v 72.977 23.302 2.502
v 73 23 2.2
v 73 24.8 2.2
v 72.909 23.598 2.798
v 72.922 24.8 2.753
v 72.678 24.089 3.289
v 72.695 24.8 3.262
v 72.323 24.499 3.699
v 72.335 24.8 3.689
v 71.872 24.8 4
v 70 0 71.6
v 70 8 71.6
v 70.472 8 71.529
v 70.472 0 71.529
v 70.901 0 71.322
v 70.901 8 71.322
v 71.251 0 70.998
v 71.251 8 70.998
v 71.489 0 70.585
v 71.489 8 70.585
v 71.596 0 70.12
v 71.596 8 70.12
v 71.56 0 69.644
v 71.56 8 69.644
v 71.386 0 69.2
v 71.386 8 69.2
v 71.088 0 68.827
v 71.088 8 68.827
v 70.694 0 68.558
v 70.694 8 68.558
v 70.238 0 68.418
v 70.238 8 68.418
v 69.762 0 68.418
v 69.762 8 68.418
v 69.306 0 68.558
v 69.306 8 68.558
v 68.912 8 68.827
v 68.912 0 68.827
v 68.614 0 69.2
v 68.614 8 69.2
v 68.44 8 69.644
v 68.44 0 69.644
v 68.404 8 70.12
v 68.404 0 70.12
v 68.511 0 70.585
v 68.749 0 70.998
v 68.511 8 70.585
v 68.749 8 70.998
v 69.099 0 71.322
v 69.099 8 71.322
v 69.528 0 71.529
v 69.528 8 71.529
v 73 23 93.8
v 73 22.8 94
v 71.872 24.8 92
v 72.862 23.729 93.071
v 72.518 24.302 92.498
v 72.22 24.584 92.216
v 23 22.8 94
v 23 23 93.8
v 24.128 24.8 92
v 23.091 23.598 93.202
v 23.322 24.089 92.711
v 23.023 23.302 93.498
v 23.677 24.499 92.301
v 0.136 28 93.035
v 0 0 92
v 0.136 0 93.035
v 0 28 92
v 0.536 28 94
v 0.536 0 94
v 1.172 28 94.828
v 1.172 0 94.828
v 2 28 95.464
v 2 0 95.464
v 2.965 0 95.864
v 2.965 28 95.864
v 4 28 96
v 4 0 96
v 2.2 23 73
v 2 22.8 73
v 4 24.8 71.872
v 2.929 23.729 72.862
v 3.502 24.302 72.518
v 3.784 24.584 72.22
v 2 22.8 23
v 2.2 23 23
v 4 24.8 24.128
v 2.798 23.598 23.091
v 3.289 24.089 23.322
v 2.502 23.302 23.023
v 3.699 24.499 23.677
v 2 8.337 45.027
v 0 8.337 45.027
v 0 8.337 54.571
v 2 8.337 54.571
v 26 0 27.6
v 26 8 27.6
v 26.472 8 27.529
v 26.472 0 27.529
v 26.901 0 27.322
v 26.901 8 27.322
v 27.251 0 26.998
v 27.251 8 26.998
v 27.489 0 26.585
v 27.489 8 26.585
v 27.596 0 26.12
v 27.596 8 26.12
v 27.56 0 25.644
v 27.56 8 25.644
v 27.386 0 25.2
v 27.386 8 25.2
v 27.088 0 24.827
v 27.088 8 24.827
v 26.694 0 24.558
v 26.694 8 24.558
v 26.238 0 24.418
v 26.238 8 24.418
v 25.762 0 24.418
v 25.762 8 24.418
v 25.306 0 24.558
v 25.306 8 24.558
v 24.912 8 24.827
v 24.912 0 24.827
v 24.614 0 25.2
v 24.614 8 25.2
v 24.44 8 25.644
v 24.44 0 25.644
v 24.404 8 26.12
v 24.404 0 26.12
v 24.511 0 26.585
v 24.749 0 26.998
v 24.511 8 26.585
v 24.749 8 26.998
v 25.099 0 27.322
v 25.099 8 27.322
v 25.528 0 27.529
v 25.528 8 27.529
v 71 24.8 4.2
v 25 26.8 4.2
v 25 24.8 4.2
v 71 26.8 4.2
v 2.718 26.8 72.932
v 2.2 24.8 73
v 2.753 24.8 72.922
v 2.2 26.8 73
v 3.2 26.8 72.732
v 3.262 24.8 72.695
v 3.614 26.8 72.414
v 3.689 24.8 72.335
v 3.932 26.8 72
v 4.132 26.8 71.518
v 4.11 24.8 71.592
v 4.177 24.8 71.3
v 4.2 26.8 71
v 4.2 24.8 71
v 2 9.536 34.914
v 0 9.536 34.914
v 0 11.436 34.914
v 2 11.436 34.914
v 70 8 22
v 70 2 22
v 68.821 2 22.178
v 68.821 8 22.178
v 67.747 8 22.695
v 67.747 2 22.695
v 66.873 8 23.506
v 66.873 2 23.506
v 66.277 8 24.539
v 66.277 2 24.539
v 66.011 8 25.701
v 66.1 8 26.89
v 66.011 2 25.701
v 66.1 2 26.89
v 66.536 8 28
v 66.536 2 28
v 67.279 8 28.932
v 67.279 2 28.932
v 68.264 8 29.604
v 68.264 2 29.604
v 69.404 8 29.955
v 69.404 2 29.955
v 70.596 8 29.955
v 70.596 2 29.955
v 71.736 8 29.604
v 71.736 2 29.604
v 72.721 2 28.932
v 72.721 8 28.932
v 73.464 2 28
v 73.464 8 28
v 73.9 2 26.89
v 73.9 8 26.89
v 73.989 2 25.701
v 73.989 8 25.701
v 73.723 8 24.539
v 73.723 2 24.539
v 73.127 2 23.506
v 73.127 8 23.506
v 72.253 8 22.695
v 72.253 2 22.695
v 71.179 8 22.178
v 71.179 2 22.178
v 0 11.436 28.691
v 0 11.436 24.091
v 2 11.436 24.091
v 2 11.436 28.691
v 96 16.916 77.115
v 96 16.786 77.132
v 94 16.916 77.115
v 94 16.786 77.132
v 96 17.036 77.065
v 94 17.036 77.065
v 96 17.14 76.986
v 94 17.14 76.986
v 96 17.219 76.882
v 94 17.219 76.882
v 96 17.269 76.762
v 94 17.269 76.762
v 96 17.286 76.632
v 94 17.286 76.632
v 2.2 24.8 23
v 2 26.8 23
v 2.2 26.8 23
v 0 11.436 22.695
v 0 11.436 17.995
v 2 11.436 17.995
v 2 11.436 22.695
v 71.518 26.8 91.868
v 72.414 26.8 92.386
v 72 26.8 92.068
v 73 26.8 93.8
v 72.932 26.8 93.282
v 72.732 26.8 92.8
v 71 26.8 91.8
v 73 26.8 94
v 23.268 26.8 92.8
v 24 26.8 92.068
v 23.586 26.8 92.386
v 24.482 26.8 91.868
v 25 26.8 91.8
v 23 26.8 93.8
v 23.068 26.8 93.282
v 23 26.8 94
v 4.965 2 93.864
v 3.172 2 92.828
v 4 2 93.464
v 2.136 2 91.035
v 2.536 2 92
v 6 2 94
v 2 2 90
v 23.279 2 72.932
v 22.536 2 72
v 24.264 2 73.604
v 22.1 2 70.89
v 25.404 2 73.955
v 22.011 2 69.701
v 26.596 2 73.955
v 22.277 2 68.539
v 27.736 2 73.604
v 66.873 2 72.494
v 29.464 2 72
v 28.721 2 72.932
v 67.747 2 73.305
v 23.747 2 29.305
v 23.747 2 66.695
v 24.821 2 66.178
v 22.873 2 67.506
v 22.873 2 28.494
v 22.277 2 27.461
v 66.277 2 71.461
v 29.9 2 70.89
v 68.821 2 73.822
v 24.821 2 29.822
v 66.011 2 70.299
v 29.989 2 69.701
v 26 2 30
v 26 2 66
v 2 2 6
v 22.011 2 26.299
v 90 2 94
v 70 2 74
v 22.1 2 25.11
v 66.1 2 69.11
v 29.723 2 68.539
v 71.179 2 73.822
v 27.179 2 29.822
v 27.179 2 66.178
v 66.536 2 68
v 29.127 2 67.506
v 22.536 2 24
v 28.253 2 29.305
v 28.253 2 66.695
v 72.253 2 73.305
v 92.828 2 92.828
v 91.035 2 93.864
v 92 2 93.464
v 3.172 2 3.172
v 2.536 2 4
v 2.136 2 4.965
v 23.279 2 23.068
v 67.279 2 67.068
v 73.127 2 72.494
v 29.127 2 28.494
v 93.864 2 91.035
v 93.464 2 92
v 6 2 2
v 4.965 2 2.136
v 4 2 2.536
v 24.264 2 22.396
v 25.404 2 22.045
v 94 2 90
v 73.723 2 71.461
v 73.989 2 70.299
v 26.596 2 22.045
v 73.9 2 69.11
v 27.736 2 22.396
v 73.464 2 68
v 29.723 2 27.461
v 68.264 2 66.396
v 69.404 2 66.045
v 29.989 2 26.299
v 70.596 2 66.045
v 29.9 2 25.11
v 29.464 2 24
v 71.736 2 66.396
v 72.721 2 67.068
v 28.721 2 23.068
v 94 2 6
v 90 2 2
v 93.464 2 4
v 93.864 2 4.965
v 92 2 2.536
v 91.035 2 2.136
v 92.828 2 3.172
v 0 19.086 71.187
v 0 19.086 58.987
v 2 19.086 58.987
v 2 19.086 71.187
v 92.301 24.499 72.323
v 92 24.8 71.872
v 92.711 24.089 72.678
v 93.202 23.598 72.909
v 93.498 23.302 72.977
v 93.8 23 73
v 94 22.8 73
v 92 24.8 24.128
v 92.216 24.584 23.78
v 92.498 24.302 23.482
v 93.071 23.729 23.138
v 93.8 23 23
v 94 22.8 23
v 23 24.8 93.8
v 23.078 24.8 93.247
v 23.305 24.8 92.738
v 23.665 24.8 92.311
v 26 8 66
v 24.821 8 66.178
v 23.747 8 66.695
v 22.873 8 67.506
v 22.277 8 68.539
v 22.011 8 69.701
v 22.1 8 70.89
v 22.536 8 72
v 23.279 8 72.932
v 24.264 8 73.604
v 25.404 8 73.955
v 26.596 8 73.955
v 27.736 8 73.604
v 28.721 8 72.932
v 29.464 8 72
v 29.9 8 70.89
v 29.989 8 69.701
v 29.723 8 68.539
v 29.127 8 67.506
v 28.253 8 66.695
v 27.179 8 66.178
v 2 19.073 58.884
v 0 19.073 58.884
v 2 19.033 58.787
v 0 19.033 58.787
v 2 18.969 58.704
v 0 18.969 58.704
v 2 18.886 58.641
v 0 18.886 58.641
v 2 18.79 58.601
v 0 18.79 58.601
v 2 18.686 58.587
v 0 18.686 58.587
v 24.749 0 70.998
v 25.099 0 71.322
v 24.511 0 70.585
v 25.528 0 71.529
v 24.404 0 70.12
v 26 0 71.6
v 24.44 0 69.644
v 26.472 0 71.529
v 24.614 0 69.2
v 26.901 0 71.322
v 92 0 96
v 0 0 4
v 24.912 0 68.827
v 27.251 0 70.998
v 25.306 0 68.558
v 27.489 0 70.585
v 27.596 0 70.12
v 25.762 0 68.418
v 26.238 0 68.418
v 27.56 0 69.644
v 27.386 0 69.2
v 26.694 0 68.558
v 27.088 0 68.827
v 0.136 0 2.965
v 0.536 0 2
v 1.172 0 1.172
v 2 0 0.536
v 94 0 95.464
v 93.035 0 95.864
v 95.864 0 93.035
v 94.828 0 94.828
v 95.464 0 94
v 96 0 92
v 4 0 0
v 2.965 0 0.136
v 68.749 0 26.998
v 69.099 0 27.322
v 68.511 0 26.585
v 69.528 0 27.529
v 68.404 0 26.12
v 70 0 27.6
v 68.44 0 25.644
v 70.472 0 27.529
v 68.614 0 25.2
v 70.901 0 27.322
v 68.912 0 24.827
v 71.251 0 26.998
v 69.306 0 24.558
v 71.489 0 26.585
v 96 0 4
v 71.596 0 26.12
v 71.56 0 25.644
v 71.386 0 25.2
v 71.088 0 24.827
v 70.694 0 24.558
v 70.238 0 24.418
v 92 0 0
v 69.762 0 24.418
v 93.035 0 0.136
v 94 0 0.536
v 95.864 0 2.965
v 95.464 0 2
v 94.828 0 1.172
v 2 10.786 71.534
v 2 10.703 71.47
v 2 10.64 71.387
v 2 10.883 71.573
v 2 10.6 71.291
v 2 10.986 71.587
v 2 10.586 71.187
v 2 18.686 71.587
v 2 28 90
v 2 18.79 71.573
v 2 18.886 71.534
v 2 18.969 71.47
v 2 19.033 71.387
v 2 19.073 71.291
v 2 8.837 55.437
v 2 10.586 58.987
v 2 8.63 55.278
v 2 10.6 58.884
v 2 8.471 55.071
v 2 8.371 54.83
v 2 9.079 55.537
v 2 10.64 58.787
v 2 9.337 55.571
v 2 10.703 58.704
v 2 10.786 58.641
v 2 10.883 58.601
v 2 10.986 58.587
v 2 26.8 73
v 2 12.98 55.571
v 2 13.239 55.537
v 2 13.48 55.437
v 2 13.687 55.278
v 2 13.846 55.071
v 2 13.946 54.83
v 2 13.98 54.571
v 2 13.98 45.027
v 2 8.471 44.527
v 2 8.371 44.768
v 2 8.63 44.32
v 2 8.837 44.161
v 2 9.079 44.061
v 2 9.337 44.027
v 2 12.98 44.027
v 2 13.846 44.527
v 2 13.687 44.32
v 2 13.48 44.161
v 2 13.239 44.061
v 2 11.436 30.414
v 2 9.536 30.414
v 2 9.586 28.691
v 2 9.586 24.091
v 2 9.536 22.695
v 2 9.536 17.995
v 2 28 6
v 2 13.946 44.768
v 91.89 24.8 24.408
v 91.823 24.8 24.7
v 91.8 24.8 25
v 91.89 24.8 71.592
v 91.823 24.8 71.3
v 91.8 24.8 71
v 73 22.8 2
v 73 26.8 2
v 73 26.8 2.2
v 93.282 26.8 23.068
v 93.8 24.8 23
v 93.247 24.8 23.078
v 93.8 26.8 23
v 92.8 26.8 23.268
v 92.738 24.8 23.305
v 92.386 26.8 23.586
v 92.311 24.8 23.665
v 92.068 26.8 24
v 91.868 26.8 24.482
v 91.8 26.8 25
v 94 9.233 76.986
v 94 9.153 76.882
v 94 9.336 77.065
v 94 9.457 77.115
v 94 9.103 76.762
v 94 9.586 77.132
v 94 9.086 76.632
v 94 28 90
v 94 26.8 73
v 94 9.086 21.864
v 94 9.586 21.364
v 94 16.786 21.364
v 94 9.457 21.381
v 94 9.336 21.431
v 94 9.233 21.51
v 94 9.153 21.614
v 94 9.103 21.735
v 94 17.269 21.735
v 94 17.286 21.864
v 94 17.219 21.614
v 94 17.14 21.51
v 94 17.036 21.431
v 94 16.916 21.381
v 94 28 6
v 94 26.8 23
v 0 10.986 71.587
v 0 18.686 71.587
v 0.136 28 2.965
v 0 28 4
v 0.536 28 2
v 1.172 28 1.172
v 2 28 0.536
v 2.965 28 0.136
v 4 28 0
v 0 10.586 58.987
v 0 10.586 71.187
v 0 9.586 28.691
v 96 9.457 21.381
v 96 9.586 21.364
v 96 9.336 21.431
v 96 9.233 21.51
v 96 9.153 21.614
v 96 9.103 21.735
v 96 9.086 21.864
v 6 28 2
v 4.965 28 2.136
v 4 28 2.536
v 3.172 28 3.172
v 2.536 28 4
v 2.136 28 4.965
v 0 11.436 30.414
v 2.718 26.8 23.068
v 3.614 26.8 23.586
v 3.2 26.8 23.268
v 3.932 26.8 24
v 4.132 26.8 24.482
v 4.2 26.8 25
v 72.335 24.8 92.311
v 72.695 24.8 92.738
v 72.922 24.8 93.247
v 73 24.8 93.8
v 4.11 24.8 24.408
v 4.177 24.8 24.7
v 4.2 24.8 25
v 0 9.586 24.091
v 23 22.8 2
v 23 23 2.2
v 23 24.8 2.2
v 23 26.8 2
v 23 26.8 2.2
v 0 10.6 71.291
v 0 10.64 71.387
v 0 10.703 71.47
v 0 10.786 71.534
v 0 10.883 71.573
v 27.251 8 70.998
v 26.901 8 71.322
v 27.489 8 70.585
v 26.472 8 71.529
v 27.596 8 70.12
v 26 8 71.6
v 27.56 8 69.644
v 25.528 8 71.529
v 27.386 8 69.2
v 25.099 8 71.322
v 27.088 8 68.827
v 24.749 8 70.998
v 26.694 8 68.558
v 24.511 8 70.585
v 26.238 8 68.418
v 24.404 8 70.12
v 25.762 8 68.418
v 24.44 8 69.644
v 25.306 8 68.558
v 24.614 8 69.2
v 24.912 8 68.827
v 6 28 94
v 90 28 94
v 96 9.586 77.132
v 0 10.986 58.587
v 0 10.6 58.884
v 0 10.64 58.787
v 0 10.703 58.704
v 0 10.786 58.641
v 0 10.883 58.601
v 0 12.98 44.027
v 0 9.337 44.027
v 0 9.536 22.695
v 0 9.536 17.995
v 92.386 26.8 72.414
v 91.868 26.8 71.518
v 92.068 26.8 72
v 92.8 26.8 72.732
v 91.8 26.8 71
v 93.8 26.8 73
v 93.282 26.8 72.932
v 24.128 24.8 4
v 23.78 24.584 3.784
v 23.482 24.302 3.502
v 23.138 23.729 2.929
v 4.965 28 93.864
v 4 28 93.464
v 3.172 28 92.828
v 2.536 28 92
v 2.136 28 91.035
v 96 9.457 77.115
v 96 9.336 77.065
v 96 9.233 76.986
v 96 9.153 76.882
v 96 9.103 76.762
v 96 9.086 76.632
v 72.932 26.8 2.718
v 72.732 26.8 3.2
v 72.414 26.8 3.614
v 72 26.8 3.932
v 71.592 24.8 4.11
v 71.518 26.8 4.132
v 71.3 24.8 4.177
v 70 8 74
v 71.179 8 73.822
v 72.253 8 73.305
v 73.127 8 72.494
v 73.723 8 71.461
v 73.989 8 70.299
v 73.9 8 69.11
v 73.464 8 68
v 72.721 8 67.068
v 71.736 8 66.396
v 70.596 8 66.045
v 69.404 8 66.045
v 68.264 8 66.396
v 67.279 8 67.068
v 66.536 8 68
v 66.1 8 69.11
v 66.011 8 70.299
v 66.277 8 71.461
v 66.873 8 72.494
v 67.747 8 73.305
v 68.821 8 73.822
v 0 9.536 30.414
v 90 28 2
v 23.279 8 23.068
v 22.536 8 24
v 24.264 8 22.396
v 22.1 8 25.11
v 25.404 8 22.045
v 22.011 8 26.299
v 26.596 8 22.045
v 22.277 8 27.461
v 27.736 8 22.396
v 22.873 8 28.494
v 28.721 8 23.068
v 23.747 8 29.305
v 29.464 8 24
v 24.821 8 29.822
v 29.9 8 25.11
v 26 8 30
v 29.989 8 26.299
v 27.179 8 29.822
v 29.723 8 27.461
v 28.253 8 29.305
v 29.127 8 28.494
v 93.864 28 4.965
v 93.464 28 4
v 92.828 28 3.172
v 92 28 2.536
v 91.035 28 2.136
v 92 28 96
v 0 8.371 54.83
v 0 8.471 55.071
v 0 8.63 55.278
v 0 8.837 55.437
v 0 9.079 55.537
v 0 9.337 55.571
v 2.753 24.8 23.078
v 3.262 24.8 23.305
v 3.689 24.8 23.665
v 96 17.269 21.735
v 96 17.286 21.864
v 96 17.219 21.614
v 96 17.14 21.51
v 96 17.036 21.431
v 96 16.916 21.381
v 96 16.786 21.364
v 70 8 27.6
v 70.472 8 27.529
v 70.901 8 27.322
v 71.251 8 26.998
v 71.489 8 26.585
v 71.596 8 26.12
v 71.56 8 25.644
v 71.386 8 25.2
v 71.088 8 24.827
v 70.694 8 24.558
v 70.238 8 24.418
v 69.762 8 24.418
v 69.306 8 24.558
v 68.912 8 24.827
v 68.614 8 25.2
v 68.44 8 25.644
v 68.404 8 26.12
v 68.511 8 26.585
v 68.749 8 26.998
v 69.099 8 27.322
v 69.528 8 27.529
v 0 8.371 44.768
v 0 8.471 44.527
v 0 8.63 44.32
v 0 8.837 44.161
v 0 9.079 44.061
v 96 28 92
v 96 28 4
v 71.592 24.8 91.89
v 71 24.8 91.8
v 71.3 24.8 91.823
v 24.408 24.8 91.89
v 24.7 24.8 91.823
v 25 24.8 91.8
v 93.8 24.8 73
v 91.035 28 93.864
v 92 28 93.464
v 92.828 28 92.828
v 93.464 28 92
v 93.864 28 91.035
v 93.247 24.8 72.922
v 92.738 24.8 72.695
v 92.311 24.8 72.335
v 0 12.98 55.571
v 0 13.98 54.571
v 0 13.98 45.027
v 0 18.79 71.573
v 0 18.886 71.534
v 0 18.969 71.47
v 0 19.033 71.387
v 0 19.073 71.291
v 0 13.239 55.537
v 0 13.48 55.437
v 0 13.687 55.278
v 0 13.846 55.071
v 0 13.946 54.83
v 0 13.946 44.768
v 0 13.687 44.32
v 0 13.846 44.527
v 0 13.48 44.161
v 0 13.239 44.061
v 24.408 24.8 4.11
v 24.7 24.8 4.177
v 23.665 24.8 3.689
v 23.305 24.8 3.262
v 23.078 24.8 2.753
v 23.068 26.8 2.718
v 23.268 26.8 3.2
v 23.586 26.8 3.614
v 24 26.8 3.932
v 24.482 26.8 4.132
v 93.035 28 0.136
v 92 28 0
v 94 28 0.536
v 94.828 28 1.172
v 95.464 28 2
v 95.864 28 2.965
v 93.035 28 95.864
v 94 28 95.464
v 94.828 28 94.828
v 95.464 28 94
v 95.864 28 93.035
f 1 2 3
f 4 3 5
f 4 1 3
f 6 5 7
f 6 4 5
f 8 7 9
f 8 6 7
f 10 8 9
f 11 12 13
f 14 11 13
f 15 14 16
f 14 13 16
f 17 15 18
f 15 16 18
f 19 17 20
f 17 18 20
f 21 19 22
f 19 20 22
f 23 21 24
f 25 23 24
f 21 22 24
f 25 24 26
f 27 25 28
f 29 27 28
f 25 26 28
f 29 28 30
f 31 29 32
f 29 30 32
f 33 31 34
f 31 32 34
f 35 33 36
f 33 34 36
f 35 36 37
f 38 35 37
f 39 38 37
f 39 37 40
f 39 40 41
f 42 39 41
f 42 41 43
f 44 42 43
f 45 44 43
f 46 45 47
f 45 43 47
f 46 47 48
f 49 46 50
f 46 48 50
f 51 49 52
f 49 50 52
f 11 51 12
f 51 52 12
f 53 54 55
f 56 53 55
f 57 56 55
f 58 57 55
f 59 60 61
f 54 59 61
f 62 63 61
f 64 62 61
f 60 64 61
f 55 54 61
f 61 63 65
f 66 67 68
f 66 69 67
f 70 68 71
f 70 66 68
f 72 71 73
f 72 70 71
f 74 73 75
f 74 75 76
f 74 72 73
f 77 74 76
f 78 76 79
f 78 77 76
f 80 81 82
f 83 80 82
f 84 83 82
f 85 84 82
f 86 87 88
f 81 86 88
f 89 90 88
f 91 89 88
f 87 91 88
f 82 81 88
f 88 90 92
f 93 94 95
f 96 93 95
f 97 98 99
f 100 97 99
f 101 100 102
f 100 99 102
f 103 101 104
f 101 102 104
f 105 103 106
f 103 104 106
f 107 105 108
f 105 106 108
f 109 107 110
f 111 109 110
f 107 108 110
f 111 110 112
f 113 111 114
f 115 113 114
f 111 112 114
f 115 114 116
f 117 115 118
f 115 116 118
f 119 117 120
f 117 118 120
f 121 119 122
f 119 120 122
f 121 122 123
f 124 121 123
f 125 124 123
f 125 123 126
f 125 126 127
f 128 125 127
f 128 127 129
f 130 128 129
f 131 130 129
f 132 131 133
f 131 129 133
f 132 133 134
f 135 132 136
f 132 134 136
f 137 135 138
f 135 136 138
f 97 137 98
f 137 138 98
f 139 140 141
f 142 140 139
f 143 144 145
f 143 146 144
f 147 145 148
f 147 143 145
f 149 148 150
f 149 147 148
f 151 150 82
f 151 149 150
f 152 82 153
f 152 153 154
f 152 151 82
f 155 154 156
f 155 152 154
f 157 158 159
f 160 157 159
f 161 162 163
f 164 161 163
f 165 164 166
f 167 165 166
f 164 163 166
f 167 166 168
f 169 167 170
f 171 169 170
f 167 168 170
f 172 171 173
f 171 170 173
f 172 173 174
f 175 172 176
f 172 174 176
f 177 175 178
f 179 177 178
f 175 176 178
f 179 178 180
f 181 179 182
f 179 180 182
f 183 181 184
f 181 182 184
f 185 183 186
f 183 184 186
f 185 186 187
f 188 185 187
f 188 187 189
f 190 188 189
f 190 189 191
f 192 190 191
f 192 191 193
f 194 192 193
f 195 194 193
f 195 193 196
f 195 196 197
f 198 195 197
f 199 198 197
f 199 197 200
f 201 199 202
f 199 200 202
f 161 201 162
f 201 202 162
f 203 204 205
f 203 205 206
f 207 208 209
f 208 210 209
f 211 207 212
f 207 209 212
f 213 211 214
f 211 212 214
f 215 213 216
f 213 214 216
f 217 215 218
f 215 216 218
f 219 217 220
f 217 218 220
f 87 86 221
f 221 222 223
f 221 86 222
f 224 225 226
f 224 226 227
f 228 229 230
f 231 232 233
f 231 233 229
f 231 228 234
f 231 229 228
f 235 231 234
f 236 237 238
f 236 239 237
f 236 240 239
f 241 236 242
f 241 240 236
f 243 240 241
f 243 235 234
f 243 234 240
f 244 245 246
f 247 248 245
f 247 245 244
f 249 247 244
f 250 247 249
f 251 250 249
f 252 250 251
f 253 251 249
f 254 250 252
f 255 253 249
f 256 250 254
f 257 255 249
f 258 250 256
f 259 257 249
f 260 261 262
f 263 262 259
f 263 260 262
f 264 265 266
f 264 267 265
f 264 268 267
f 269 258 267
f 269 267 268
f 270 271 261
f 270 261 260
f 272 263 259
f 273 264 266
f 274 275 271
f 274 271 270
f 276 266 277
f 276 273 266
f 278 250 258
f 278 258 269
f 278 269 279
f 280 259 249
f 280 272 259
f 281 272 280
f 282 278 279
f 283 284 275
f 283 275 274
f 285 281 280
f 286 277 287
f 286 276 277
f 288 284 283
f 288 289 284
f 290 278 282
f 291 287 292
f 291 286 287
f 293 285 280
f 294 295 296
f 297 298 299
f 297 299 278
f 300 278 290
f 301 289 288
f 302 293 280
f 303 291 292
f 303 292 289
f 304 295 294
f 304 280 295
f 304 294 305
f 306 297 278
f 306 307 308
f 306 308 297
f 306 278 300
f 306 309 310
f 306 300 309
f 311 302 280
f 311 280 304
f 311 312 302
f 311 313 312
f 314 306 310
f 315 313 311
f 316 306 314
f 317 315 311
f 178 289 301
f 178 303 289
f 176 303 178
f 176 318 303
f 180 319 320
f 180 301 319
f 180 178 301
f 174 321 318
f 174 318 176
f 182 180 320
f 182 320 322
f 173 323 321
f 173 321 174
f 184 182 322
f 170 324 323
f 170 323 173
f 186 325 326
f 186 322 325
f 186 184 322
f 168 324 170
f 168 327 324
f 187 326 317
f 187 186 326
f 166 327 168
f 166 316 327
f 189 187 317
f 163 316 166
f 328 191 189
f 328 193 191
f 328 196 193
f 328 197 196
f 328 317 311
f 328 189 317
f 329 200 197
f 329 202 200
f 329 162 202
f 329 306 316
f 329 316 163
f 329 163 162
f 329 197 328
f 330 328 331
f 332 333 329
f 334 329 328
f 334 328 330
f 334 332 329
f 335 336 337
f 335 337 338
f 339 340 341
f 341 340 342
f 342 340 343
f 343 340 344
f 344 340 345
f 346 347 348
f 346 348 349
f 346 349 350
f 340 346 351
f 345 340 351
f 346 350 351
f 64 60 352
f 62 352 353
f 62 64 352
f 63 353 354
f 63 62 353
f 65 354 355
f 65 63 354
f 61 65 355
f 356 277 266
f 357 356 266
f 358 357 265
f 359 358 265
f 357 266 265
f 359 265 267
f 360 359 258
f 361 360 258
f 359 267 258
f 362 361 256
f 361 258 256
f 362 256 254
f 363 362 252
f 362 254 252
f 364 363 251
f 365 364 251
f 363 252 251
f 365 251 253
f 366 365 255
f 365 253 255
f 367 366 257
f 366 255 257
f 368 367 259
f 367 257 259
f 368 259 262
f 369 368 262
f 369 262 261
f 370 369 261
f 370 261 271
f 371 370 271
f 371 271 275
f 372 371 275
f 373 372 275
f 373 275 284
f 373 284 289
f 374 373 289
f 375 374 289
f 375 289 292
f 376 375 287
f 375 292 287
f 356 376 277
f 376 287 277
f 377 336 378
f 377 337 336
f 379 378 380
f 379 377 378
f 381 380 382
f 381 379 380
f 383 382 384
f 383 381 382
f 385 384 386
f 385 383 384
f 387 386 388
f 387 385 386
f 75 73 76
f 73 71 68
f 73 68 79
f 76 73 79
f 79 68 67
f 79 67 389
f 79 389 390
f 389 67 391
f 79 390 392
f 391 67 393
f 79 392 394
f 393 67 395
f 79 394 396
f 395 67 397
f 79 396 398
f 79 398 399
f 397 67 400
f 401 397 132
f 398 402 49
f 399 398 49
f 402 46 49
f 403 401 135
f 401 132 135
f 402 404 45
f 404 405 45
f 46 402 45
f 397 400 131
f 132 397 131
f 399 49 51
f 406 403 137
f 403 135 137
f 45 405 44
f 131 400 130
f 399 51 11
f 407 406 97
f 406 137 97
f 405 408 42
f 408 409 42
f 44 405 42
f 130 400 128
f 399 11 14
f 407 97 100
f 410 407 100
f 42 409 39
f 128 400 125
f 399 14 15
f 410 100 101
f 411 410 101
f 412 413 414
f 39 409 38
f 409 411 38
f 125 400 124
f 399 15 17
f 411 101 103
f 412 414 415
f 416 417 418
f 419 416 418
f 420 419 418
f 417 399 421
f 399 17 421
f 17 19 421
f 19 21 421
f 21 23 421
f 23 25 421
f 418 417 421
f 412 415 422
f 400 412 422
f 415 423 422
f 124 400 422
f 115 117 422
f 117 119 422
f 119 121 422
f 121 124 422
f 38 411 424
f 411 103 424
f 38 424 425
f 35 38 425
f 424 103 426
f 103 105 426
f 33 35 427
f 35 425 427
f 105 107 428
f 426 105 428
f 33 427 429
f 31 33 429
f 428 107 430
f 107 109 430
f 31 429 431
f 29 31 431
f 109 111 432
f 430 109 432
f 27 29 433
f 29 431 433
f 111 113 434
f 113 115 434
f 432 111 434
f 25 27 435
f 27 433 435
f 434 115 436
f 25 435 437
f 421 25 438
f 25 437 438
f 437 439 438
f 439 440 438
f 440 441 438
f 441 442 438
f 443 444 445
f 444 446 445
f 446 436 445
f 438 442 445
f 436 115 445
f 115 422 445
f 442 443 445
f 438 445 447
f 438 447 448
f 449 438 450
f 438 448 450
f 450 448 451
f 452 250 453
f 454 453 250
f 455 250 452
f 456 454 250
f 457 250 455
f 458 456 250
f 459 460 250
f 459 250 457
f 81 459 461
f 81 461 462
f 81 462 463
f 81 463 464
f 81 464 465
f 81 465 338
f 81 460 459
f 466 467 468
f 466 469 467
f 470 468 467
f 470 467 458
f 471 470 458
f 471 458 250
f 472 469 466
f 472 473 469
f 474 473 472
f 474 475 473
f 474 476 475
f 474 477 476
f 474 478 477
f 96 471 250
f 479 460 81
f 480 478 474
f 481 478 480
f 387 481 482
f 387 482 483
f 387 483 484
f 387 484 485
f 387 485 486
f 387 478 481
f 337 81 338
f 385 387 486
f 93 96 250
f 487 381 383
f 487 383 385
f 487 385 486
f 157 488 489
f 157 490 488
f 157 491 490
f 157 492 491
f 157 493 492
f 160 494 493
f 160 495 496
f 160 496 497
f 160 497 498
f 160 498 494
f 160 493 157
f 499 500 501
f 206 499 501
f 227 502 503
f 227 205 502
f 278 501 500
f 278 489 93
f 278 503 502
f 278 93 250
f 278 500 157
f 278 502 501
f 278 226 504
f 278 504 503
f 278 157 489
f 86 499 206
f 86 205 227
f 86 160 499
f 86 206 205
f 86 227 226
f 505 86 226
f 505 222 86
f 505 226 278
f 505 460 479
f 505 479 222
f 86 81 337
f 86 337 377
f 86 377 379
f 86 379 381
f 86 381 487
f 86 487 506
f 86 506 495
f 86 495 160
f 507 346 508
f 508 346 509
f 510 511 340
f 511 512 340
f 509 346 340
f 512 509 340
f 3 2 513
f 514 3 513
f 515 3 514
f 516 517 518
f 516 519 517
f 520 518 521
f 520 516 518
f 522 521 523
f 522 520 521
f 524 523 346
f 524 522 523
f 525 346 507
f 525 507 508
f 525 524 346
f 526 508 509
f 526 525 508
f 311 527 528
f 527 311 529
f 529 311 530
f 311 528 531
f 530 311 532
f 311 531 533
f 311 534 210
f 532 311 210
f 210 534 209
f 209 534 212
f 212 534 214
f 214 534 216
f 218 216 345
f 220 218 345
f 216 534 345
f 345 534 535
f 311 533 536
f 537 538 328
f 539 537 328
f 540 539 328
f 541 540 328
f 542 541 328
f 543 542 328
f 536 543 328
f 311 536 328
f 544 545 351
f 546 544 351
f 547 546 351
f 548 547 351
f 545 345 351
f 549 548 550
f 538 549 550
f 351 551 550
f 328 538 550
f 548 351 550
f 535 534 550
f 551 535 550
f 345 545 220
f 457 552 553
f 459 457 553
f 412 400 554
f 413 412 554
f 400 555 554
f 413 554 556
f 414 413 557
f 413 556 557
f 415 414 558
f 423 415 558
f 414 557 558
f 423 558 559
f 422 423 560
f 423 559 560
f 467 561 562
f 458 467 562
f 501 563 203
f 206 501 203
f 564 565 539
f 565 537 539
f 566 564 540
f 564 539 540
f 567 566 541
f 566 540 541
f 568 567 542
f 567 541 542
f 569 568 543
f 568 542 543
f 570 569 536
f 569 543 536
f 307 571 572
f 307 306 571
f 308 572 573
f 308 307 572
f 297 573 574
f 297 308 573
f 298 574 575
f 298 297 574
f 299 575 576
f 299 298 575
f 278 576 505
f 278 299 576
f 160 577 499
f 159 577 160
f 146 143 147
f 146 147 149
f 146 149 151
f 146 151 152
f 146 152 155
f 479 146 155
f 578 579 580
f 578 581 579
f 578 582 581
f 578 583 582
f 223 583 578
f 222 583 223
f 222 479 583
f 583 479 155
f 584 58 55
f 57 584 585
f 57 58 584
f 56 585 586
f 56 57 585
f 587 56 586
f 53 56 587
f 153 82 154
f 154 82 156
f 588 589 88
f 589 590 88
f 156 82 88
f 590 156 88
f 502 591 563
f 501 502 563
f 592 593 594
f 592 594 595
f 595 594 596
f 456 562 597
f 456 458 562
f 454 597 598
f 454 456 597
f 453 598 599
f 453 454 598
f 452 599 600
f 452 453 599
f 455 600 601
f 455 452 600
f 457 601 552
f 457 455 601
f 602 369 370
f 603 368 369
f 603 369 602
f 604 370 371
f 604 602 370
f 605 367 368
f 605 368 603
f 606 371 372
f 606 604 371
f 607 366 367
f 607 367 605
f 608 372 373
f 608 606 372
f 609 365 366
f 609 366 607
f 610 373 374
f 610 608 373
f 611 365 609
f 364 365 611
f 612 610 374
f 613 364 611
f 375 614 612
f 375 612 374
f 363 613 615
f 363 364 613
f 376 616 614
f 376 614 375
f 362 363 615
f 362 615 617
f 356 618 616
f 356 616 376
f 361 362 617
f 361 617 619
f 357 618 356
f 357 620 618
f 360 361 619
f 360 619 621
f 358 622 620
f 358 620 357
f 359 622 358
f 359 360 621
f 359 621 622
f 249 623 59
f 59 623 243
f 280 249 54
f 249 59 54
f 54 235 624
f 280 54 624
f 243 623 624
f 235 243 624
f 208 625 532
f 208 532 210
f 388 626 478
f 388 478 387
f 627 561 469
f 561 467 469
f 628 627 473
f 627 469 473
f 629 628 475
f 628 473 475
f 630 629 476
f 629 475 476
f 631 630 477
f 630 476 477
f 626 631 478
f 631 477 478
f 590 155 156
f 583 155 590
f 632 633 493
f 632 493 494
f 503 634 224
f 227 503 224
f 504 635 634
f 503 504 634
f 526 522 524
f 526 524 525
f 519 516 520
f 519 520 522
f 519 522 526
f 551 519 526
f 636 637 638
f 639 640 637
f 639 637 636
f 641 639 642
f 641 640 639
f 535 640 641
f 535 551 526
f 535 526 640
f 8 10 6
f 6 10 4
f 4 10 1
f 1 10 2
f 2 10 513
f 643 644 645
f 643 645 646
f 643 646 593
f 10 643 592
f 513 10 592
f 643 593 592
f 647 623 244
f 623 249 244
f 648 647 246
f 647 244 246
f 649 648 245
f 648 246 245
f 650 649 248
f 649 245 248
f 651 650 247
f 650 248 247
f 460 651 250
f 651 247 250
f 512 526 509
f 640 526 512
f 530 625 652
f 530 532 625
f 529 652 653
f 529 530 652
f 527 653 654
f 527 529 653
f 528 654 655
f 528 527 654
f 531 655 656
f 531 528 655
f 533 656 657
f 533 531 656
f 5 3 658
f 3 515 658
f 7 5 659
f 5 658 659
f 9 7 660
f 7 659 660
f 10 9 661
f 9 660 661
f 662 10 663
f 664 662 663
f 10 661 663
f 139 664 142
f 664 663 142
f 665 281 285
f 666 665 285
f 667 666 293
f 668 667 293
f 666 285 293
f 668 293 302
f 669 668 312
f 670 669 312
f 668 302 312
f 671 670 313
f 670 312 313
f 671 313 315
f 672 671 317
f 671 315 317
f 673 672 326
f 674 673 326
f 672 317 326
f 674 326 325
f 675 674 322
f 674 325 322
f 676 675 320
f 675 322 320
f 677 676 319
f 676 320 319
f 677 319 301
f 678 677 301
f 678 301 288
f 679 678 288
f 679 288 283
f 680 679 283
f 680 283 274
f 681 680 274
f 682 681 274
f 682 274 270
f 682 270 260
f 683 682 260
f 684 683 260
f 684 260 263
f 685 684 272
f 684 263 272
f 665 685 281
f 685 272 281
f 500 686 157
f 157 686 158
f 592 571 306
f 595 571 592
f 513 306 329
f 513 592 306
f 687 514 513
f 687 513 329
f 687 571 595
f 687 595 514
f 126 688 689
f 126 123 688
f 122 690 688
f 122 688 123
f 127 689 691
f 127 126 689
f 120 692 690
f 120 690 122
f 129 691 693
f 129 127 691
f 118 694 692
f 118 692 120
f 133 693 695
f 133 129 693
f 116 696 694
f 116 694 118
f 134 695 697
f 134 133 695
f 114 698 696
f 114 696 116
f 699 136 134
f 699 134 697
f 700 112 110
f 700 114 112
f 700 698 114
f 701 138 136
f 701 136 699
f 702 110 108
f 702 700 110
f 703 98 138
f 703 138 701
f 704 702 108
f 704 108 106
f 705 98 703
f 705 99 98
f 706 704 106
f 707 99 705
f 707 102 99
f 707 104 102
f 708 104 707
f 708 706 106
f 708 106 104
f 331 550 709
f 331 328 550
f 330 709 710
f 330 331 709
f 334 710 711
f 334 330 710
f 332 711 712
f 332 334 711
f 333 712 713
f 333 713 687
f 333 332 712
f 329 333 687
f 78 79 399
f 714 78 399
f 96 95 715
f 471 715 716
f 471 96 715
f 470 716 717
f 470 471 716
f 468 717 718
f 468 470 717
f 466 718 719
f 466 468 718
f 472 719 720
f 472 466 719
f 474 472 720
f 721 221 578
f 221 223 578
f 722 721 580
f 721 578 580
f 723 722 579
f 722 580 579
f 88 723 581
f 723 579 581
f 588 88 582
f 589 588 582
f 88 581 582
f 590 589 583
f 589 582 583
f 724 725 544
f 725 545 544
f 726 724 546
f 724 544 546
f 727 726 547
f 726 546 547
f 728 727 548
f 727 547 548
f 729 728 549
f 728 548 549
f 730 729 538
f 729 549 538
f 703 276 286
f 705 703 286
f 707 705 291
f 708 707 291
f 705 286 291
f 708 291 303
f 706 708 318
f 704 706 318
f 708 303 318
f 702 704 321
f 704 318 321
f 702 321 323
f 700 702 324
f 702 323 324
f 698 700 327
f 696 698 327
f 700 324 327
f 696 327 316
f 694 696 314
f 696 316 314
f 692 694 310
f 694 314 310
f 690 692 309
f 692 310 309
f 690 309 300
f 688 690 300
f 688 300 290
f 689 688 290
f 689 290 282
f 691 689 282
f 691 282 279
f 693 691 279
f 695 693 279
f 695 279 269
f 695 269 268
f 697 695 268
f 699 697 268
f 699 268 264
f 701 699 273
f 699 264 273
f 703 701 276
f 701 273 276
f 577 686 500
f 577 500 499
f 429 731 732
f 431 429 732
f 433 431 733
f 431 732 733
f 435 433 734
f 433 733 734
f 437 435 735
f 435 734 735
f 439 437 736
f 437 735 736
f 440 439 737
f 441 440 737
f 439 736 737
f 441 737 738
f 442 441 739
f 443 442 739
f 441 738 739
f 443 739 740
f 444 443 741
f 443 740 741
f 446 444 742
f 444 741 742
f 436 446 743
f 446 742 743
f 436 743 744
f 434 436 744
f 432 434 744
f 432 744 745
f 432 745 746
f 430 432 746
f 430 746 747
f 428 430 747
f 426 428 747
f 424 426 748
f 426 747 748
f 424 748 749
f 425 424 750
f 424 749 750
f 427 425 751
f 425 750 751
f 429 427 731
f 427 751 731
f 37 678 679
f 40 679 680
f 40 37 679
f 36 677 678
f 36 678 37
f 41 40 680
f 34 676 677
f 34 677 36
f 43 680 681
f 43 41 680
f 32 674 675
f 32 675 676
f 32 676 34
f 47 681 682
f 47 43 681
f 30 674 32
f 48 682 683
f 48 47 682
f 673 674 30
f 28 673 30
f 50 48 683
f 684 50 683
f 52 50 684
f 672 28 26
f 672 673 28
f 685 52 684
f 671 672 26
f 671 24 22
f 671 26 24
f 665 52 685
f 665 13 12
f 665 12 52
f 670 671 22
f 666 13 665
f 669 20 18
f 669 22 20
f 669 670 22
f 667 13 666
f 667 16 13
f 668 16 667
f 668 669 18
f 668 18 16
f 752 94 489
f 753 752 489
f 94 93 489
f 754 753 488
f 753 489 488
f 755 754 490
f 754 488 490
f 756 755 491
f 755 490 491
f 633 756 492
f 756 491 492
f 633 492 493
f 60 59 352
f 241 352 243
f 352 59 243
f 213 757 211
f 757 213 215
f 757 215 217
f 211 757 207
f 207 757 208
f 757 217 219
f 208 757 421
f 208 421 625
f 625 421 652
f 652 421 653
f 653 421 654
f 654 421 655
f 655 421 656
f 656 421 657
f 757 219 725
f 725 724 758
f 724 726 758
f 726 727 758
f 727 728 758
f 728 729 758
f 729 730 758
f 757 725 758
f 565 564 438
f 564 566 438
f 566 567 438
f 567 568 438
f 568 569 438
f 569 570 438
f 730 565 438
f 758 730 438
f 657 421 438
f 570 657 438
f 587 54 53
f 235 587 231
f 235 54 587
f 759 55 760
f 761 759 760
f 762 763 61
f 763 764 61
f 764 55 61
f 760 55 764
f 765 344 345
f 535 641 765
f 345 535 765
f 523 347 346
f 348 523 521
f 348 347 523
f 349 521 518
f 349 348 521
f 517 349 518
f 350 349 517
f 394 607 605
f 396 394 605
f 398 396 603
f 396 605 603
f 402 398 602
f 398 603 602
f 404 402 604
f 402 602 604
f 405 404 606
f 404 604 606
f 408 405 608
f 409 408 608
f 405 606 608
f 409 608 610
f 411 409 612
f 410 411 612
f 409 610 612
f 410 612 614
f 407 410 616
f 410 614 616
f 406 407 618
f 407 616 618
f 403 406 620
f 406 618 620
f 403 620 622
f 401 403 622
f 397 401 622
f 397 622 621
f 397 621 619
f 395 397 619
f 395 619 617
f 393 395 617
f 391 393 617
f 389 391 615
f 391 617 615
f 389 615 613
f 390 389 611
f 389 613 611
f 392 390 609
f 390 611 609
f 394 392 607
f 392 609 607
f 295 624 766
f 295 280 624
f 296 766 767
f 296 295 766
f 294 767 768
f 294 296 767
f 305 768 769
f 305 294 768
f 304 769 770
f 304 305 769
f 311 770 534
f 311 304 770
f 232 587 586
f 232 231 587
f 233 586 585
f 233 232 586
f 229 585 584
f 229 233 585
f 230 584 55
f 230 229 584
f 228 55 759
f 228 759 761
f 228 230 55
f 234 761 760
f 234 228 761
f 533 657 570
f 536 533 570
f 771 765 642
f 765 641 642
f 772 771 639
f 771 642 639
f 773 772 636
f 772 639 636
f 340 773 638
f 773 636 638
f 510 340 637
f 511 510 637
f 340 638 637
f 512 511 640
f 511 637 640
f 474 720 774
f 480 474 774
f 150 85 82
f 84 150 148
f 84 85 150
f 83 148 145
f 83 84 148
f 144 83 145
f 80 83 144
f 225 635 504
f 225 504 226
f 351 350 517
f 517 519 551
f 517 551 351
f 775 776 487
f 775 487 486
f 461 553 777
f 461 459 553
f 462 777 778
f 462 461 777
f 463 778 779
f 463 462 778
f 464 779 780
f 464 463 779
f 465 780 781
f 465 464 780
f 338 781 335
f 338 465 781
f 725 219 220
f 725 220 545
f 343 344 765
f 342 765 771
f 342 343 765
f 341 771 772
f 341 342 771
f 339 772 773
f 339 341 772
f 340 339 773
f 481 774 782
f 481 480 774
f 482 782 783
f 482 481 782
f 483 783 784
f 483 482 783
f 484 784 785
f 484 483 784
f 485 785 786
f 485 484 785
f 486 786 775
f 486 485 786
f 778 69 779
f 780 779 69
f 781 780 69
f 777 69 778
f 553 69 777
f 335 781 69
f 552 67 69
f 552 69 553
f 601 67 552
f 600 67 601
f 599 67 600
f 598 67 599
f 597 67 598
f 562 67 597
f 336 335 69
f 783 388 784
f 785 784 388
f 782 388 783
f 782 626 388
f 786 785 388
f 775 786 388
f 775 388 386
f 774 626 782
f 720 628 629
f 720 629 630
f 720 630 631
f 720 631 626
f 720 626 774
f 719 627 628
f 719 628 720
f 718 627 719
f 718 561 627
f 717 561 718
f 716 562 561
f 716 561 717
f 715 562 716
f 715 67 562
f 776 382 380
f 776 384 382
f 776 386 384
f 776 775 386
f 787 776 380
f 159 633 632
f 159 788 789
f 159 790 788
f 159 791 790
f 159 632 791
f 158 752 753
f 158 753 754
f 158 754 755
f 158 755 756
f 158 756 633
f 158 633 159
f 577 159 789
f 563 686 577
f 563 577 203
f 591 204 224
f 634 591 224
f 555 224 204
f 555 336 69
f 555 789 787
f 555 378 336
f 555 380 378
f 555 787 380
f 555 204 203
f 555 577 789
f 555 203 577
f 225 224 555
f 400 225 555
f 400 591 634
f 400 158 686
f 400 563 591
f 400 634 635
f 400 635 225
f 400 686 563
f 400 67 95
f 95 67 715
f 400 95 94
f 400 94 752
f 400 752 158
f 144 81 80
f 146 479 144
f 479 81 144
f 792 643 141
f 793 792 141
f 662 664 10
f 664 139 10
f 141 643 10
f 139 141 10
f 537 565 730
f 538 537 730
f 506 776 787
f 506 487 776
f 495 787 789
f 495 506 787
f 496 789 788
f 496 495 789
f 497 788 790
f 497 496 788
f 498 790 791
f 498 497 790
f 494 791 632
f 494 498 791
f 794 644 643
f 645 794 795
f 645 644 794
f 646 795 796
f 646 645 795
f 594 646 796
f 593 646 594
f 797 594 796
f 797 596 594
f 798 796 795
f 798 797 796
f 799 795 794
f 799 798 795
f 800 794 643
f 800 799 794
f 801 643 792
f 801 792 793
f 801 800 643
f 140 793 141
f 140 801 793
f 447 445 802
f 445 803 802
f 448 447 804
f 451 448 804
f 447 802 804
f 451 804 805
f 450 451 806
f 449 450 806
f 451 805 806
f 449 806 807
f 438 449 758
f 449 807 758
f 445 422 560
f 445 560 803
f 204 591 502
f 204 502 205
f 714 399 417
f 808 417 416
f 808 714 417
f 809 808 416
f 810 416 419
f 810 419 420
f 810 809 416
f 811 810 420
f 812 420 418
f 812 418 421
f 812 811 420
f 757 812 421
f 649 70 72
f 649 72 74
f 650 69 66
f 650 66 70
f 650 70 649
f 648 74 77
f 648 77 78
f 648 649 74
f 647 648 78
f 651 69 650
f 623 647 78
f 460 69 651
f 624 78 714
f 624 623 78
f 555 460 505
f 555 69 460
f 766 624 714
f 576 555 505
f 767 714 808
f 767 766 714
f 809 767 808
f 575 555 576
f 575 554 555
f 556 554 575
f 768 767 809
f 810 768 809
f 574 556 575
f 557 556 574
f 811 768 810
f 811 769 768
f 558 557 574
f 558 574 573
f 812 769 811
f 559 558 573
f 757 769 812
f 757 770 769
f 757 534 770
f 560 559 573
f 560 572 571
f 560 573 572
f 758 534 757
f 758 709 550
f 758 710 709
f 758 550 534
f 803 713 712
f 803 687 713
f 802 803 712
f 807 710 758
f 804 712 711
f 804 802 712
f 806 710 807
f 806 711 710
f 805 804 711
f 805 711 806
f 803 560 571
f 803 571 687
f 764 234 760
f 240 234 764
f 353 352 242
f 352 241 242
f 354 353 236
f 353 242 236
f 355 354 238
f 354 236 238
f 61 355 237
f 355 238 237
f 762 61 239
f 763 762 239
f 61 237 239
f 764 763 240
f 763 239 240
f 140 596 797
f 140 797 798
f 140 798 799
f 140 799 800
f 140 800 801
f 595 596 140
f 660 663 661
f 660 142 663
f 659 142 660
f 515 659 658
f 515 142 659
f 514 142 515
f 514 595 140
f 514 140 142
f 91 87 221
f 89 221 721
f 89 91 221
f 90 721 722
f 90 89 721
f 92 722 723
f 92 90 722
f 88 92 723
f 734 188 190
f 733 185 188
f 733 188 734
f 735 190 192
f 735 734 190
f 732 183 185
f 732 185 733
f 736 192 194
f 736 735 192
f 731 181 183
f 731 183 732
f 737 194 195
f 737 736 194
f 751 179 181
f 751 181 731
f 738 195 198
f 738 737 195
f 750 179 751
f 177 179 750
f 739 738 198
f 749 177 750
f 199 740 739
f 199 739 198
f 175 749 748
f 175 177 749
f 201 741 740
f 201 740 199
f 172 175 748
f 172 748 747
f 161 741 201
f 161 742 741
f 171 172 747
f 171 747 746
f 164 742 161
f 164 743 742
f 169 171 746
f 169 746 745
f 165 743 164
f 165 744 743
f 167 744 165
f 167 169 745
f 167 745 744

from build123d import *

# Parameters (mm, degrees)
SKETCH_1_W               = 96
SKETCH_1_H               = 96
EXTRUDE_1_DEPTH          = 28
SKETCH_3_W               = 92
SKETCH_3_H               = 92
CUT_EXTRUDE_1_DEPTH      = 26
FILLET_1_R               = 4
FILLET_2_R               = 4
SKETCH_4_R               = 4
EXTRUDE_2_DEPTH          = 6
SKETCH_5_R               = 1.6
CUT_EXTRUDE_2_DEPTH      = 8
SKETCH_6_W               = 12.999999928
SKETCH_6_H               = 8.49999995
SKETCH_6_W_2             = 4.700000191
SKETCH_6_H_2             = 1.900000077
SKETCH_6_W_3             = 4.600000187
SKETCH_6_H_3             = 1.849687021
SKETCH_6_W_4             = 4.500000183
SKETCH_6_W_5             = 11.544018717
SKETCH_6_H_4             = 5.642342208
CUT_EXTRUDE_3_DEPTH      = 2
FILLET_3_R               = 0.4
SKETCH_7_W               = 55.768080965
SKETCH_7_H               = 8.199999866
CUT_EXTRUDE_4_DEPTH      = 2
FILLET_4_R               = 0.5
FILLET_5_R               = 1
SKETCH_8_W               = 50
SKETCH_8_H               = 2
EXTRUDE_3_DEPTH          = 2.2
FILLET_6_R               = 2
PATTERN_CIRCULAR_1_COUNT = 4
FILLET_7_R               = 2
CHAMFER_START            = 23
CHAMFER_1_DEPTH          = 50
CHAMFER_START_2          = 22.8
CHAMFER_1_2_DEPTH        = 2
CHAMFER_2_DEPTH          = 50
CHAMFER_2_2_DEPTH        = 2
CHAMFER_3_DEPTH          = 50
CHAMFER_3_2_DEPTH        = 2
CHAMFER_4_DEPTH          = 50
CHAMFER_4_2_DEPTH        = 2


with BuildPart() as part:
    # 草图1 → 凸台-拉伸1 (new body)
    with BuildSketch(Plane(origin=(0, 0, 0), x_dir=(1, 0, 0), z_dir=(0, 1, 0))):
        with Locations((48, -48)):
            Rectangle(SKETCH_1_W, SKETCH_1_H)
    extrude(amount=EXTRUDE_1_DEPTH)

    # 草图3 → 切除-拉伸1 (cut)
    with BuildSketch(Plane(origin=(0, 28, 0), x_dir=(1, 0, 0), z_dir=(0, 1, 0))):
        with Locations((48, -48)):
            Rectangle(SKETCH_3_W, SKETCH_3_H)
    extrude(amount=-CUT_EXTRUDE_1_DEPTH, mode=Mode.SUBTRACT)

    # 圆角1
    fillet_1_edges = [part.edges().sort_by_distance(p)[0] for p in [
        (2, 15, 94),
        (2, 15, 2),
        (94, 15, 2),
        (94, 15, 94),
    ]]
    fillet(fillet_1_edges, radius=FILLET_1_R)

    # 圆角2
    fillet_2_edges = [part.edges().sort_by_distance(p)[0] for p in [
        (0, 14, 0),
        (96, 14, 0),
        (96, 14, 96),
        (0, 14, 96),
    ]]
    fillet(fillet_2_edges, radius=FILLET_2_R)

    # 草图4 → 凸台-拉伸2 (add)
    with BuildSketch(Plane(origin=(0, 2, 0), x_dir=(1, 0, 0), z_dir=(0, 1, 0))):
        with Locations(Location((26, -26, 0), (0, 0, 270))):
            Circle(SKETCH_4_R)
        with Locations(Location((70, -26, 0), (0, 0, 90))):
            Circle(SKETCH_4_R)
        with Locations(Location((70, -70, 0), (0, 0, 270))):
            Circle(SKETCH_4_R)
        with Locations(Location((26, -70, 0), (0, 0, 90))):
            Circle(SKETCH_4_R)
    extrude(amount=EXTRUDE_2_DEPTH)

    # 草图5 → 切除-拉伸2 (cut)
    with BuildSketch(Plane(origin=(0, 8, 0), x_dir=(1, 0, 0), z_dir=(0, 1, 0))):
        with Locations(Location((26, -26, 0), (0, 0, 270))):
            Circle(SKETCH_5_R)
        with Locations(Location((70, -26, 0), (0, 0, 270))):
            Circle(SKETCH_5_R)
        with Locations(Location((26, -70, 0), (0, 0, 270))):
            Circle(SKETCH_5_R)
        with Locations(Location((70, -70, 0), (0, 0, 270))):
            Circle(SKETCH_5_R)
    extrude(amount=-CUT_EXTRUDE_2_DEPTH, mode=Mode.SUBTRACT)

    # 草图6 → 切除-拉伸3 (cut)
    with BuildSketch(Plane.ZY):
        with Locations((65.087122174, 14.836156947)):
            Rectangle(SKETCH_6_W, SKETCH_6_H)
        with Locations((20.344696565, 10.485844036)):
            Rectangle(SKETCH_6_W_2, SKETCH_6_H_2)
        with Locations((26.390708755, 10.511000564)):
            Rectangle(SKETCH_6_W_3, SKETCH_6_H_3)
        with Locations((32.663721202, 10.485844036)):
            Rectangle(SKETCH_6_W_4, SKETCH_6_H_2)
        with Locations((49.799296419, 11.158551524)):
            Rectangle(SKETCH_6_W_5, SKETCH_6_H_4)
    extrude(amount=-CUT_EXTRUDE_3_DEPTH, mode=Mode.SUBTRACT)

    # 圆角3
    fillet_3_edges = [part.edges().sort_by_distance(p)[0] for p in [
        (1, 10.586156972, 58.58712221),
        (1, 19.086156922, 58.58712221),
        (1, 19.086156922, 71.587122138),
        (1, 10.586156972, 71.587122138),
    ]]
    fillet(fillet_3_edges, radius=FILLET_3_R)

    # 草图7 → 切除-拉伸4 (cut)
    with BuildSketch(Plane(origin=(96, 0, 0), x_dir=(0, 0, -1), z_dir=(1, 0, 0))):
        with Locations((-49.248086711, 13.186156826)):
            Rectangle(SKETCH_7_W, SKETCH_7_H)
    extrude(amount=-CUT_EXTRUDE_4_DEPTH, mode=Mode.SUBTRACT)

    # 圆角4
    fillet_4_edges = [part.edges().sort_by_distance(p)[0] for p in [
        (95, 9.086156893, 77.132127193),
        (95, 17.286156759, 77.132127193),
        (95, 17.286156759, 21.364046228),
        (95, 9.086156893, 21.364046228),
    ]]
    fillet(fillet_4_edges, radius=FILLET_4_R)

    # 圆角5
    fillet_5_edges = [part.edges().sort_by_distance(p)[0] for p in [
        (1, 8.33738042, 44.02728706),
        (1, 13.979722628, 44.02728706),
        (1, 13.979722628, 55.571305777),
        (1, 8.33738042, 55.571305777),
    ]]
    fillet(fillet_5_edges, radius=FILLET_5_R)

    # 草图8 → 凸台-拉伸3 (add)
    with BuildSketch(Plane(origin=(0, 0, 94), x_dir=(-1, 0, 0), z_dir=(0, 0, -1))):
        with Locations((-48, 25.8)):
            Rectangle(SKETCH_8_W, SKETCH_8_H)
    extrude_3 = extrude(amount=EXTRUDE_3_DEPTH)

    # 圆角6
    fillet_6_edges = [part.edges().sort_by_distance(p)[0] for p in [
        (73, 25.8, 91.8),
        (23, 25.8, 91.8),
    ]]
    fillet(fillet_6_edges, radius=FILLET_6_R)

    # 阵列(圆周)1: 凸台-拉伸3 ×4 about axis
    pattern_circular_1_axis = Axis((48, 0, 48), (0, 1, 0))
    for i in range(1, PATTERN_CIRCULAR_1_COUNT):
        add(extrude_3.rotate(pattern_circular_1_axis, i * 360 / PATTERN_CIRCULAR_1_COUNT))

    # 圆角7
    fillet_7_edges = [part.edges().sort_by_distance(p)[0] for p in [
        (91.8, 25.8, 23),
        (91.8, 25.8, 73),
        (23, 25.8, 4.2),
        (73, 25.8, 4.2),
        (4.2, 25.8, 73),
        (4.2, 25.8, 23),
    ]]
    fillet(fillet_7_edges, radius=FILLET_7_R)

    # 倒角1: read off the stored shape, not the designer's step
    # 倒角1 outline → 倒角1 (add)
    with BuildSketch(Plane.YZ.offset(CHAMFER_START)):
        Polygon((24.8, 2), (24.8, 4), (22.8, 2), align=None)
    extrude(amount=CHAMFER_1_DEPTH)

    # Chamfer 1 2 outline → Chamfer 1 2 (cut)
    with BuildSketch(Plane(origin=(0, 0, 0), x_dir=(1, 0, 0), z_dir=(0, 1, 0)).offset(CHAMFER_START_2)):
        with BuildLine():
            Line((73, -4.20000003), (73, -2.2))
            ThreePointArc((73, -2.2), (72.414213562, -3.614213562), (71, -4.2))
            Line((71, -4.2), (73, -4.20000003))
        make_face()
        with BuildLine():
            Line((23, -4.20000003), (25, -4.2))
            ThreePointArc((25, -4.2), (23.585786438, -3.614213562), (23, -2.2))
            Line((23, -2.2), (23, -4.20000003))
        make_face()
    extrude(amount=CHAMFER_1_2_DEPTH, mode=Mode.SUBTRACT)

    # 倒角2: read off the stored shape, not the designer's step
    # 倒角2 outline → 倒角2 (add)
    with BuildSketch(Plane.YZ.offset(CHAMFER_START)):
        Polygon((24.8, 94), (22.8, 94), (24.8, 92), align=None)
    extrude(amount=CHAMFER_2_DEPTH)

    # Chamfer 2 2 outline → Chamfer 2 2 (cut)
    with BuildSketch(Plane(origin=(0, 0, 0), x_dir=(1, 0, 0), z_dir=(0, 1, 0)).offset(CHAMFER_START_2)):
        with BuildLine():
            Line((23, -91.79999997), (23, -93.8))
            ThreePointArc((23, -93.8), (23.585786438, -92.385786438), (25, -91.8))
            Line((25, -91.8), (23, -91.79999997))
        make_face()
        with BuildLine():
            Line((73, -91.79999997), (71, -91.8))
            ThreePointArc((71, -91.8), (72.414213562, -92.385786438), (73, -93.8))
            Line((73, -93.8), (73, -91.79999997))
        make_face()
    extrude(amount=CHAMFER_2_2_DEPTH, mode=Mode.SUBTRACT)

    # 倒角3: read off the stored shape, not the designer's step
    # 倒角3 outline → 倒角3 (add)
    with BuildSketch(Plane.XY.offset(CHAMFER_START)):
        Polygon((94, 24.8), (92, 24.8), (94, 22.8), align=None)
    extrude(amount=CHAMFER_3_DEPTH)

    # Chamfer 3 2 outline → Chamfer 3 2 (cut)
    with BuildSketch(Plane(origin=(0, 0, 0), x_dir=(1, 0, 0), z_dir=(0, 1, 0)).offset(CHAMFER_START_2)):
        with BuildLine():
            Line((91.79999997, -73), (93.8, -73))
            ThreePointArc((93.8, -73), (92.385786438, -72.414213562), (91.8, -71))
            Line((91.8, -71), (91.79999997, -73))
        make_face()
        with BuildLine():
            Line((91.79999997, -23), (91.8, -25))
            ThreePointArc((91.8, -25), (92.385786438, -23.585786438), (93.8, -23))
            Line((93.8, -23), (91.79999997, -23))
        make_face()
    extrude(amount=CHAMFER_3_2_DEPTH, mode=Mode.SUBTRACT)

    # 倒角4: read off the stored shape, not the designer's step
    # 倒角4 outline → 倒角4 (add)
    with BuildSketch(Plane.XY.offset(CHAMFER_START)):
        Polygon((2, 24.8), (2, 22.8), (4, 24.8), align=None)
    extrude(amount=CHAMFER_4_DEPTH)

    # Chamfer 4 2 outline → Chamfer 4 2 (cut)
    with BuildSketch(Plane(origin=(0, 0, 0), x_dir=(1, 0, 0), z_dir=(0, 1, 0)).offset(CHAMFER_START_2)):
        with BuildLine():
            Line((4.20000003, -23), (2.2, -23))
            ThreePointArc((2.2, -23), (3.614213562, -23.585786438), (4.2, -25))
            Line((4.2, -25), (4.20000003, -23))
        make_face()
        with BuildLine():
            Line((4.200000031, -73), (4.2, -71))
            ThreePointArc((4.2, -71), (3.614213562, -72.414213562), (2.2, -73))
            Line((2.2, -73), (4.200000031, -73))
        make_face()
    extrude(amount=CHAMFER_4_2_DEPTH, mode=Mode.SUBTRACT)


solid = part.part
